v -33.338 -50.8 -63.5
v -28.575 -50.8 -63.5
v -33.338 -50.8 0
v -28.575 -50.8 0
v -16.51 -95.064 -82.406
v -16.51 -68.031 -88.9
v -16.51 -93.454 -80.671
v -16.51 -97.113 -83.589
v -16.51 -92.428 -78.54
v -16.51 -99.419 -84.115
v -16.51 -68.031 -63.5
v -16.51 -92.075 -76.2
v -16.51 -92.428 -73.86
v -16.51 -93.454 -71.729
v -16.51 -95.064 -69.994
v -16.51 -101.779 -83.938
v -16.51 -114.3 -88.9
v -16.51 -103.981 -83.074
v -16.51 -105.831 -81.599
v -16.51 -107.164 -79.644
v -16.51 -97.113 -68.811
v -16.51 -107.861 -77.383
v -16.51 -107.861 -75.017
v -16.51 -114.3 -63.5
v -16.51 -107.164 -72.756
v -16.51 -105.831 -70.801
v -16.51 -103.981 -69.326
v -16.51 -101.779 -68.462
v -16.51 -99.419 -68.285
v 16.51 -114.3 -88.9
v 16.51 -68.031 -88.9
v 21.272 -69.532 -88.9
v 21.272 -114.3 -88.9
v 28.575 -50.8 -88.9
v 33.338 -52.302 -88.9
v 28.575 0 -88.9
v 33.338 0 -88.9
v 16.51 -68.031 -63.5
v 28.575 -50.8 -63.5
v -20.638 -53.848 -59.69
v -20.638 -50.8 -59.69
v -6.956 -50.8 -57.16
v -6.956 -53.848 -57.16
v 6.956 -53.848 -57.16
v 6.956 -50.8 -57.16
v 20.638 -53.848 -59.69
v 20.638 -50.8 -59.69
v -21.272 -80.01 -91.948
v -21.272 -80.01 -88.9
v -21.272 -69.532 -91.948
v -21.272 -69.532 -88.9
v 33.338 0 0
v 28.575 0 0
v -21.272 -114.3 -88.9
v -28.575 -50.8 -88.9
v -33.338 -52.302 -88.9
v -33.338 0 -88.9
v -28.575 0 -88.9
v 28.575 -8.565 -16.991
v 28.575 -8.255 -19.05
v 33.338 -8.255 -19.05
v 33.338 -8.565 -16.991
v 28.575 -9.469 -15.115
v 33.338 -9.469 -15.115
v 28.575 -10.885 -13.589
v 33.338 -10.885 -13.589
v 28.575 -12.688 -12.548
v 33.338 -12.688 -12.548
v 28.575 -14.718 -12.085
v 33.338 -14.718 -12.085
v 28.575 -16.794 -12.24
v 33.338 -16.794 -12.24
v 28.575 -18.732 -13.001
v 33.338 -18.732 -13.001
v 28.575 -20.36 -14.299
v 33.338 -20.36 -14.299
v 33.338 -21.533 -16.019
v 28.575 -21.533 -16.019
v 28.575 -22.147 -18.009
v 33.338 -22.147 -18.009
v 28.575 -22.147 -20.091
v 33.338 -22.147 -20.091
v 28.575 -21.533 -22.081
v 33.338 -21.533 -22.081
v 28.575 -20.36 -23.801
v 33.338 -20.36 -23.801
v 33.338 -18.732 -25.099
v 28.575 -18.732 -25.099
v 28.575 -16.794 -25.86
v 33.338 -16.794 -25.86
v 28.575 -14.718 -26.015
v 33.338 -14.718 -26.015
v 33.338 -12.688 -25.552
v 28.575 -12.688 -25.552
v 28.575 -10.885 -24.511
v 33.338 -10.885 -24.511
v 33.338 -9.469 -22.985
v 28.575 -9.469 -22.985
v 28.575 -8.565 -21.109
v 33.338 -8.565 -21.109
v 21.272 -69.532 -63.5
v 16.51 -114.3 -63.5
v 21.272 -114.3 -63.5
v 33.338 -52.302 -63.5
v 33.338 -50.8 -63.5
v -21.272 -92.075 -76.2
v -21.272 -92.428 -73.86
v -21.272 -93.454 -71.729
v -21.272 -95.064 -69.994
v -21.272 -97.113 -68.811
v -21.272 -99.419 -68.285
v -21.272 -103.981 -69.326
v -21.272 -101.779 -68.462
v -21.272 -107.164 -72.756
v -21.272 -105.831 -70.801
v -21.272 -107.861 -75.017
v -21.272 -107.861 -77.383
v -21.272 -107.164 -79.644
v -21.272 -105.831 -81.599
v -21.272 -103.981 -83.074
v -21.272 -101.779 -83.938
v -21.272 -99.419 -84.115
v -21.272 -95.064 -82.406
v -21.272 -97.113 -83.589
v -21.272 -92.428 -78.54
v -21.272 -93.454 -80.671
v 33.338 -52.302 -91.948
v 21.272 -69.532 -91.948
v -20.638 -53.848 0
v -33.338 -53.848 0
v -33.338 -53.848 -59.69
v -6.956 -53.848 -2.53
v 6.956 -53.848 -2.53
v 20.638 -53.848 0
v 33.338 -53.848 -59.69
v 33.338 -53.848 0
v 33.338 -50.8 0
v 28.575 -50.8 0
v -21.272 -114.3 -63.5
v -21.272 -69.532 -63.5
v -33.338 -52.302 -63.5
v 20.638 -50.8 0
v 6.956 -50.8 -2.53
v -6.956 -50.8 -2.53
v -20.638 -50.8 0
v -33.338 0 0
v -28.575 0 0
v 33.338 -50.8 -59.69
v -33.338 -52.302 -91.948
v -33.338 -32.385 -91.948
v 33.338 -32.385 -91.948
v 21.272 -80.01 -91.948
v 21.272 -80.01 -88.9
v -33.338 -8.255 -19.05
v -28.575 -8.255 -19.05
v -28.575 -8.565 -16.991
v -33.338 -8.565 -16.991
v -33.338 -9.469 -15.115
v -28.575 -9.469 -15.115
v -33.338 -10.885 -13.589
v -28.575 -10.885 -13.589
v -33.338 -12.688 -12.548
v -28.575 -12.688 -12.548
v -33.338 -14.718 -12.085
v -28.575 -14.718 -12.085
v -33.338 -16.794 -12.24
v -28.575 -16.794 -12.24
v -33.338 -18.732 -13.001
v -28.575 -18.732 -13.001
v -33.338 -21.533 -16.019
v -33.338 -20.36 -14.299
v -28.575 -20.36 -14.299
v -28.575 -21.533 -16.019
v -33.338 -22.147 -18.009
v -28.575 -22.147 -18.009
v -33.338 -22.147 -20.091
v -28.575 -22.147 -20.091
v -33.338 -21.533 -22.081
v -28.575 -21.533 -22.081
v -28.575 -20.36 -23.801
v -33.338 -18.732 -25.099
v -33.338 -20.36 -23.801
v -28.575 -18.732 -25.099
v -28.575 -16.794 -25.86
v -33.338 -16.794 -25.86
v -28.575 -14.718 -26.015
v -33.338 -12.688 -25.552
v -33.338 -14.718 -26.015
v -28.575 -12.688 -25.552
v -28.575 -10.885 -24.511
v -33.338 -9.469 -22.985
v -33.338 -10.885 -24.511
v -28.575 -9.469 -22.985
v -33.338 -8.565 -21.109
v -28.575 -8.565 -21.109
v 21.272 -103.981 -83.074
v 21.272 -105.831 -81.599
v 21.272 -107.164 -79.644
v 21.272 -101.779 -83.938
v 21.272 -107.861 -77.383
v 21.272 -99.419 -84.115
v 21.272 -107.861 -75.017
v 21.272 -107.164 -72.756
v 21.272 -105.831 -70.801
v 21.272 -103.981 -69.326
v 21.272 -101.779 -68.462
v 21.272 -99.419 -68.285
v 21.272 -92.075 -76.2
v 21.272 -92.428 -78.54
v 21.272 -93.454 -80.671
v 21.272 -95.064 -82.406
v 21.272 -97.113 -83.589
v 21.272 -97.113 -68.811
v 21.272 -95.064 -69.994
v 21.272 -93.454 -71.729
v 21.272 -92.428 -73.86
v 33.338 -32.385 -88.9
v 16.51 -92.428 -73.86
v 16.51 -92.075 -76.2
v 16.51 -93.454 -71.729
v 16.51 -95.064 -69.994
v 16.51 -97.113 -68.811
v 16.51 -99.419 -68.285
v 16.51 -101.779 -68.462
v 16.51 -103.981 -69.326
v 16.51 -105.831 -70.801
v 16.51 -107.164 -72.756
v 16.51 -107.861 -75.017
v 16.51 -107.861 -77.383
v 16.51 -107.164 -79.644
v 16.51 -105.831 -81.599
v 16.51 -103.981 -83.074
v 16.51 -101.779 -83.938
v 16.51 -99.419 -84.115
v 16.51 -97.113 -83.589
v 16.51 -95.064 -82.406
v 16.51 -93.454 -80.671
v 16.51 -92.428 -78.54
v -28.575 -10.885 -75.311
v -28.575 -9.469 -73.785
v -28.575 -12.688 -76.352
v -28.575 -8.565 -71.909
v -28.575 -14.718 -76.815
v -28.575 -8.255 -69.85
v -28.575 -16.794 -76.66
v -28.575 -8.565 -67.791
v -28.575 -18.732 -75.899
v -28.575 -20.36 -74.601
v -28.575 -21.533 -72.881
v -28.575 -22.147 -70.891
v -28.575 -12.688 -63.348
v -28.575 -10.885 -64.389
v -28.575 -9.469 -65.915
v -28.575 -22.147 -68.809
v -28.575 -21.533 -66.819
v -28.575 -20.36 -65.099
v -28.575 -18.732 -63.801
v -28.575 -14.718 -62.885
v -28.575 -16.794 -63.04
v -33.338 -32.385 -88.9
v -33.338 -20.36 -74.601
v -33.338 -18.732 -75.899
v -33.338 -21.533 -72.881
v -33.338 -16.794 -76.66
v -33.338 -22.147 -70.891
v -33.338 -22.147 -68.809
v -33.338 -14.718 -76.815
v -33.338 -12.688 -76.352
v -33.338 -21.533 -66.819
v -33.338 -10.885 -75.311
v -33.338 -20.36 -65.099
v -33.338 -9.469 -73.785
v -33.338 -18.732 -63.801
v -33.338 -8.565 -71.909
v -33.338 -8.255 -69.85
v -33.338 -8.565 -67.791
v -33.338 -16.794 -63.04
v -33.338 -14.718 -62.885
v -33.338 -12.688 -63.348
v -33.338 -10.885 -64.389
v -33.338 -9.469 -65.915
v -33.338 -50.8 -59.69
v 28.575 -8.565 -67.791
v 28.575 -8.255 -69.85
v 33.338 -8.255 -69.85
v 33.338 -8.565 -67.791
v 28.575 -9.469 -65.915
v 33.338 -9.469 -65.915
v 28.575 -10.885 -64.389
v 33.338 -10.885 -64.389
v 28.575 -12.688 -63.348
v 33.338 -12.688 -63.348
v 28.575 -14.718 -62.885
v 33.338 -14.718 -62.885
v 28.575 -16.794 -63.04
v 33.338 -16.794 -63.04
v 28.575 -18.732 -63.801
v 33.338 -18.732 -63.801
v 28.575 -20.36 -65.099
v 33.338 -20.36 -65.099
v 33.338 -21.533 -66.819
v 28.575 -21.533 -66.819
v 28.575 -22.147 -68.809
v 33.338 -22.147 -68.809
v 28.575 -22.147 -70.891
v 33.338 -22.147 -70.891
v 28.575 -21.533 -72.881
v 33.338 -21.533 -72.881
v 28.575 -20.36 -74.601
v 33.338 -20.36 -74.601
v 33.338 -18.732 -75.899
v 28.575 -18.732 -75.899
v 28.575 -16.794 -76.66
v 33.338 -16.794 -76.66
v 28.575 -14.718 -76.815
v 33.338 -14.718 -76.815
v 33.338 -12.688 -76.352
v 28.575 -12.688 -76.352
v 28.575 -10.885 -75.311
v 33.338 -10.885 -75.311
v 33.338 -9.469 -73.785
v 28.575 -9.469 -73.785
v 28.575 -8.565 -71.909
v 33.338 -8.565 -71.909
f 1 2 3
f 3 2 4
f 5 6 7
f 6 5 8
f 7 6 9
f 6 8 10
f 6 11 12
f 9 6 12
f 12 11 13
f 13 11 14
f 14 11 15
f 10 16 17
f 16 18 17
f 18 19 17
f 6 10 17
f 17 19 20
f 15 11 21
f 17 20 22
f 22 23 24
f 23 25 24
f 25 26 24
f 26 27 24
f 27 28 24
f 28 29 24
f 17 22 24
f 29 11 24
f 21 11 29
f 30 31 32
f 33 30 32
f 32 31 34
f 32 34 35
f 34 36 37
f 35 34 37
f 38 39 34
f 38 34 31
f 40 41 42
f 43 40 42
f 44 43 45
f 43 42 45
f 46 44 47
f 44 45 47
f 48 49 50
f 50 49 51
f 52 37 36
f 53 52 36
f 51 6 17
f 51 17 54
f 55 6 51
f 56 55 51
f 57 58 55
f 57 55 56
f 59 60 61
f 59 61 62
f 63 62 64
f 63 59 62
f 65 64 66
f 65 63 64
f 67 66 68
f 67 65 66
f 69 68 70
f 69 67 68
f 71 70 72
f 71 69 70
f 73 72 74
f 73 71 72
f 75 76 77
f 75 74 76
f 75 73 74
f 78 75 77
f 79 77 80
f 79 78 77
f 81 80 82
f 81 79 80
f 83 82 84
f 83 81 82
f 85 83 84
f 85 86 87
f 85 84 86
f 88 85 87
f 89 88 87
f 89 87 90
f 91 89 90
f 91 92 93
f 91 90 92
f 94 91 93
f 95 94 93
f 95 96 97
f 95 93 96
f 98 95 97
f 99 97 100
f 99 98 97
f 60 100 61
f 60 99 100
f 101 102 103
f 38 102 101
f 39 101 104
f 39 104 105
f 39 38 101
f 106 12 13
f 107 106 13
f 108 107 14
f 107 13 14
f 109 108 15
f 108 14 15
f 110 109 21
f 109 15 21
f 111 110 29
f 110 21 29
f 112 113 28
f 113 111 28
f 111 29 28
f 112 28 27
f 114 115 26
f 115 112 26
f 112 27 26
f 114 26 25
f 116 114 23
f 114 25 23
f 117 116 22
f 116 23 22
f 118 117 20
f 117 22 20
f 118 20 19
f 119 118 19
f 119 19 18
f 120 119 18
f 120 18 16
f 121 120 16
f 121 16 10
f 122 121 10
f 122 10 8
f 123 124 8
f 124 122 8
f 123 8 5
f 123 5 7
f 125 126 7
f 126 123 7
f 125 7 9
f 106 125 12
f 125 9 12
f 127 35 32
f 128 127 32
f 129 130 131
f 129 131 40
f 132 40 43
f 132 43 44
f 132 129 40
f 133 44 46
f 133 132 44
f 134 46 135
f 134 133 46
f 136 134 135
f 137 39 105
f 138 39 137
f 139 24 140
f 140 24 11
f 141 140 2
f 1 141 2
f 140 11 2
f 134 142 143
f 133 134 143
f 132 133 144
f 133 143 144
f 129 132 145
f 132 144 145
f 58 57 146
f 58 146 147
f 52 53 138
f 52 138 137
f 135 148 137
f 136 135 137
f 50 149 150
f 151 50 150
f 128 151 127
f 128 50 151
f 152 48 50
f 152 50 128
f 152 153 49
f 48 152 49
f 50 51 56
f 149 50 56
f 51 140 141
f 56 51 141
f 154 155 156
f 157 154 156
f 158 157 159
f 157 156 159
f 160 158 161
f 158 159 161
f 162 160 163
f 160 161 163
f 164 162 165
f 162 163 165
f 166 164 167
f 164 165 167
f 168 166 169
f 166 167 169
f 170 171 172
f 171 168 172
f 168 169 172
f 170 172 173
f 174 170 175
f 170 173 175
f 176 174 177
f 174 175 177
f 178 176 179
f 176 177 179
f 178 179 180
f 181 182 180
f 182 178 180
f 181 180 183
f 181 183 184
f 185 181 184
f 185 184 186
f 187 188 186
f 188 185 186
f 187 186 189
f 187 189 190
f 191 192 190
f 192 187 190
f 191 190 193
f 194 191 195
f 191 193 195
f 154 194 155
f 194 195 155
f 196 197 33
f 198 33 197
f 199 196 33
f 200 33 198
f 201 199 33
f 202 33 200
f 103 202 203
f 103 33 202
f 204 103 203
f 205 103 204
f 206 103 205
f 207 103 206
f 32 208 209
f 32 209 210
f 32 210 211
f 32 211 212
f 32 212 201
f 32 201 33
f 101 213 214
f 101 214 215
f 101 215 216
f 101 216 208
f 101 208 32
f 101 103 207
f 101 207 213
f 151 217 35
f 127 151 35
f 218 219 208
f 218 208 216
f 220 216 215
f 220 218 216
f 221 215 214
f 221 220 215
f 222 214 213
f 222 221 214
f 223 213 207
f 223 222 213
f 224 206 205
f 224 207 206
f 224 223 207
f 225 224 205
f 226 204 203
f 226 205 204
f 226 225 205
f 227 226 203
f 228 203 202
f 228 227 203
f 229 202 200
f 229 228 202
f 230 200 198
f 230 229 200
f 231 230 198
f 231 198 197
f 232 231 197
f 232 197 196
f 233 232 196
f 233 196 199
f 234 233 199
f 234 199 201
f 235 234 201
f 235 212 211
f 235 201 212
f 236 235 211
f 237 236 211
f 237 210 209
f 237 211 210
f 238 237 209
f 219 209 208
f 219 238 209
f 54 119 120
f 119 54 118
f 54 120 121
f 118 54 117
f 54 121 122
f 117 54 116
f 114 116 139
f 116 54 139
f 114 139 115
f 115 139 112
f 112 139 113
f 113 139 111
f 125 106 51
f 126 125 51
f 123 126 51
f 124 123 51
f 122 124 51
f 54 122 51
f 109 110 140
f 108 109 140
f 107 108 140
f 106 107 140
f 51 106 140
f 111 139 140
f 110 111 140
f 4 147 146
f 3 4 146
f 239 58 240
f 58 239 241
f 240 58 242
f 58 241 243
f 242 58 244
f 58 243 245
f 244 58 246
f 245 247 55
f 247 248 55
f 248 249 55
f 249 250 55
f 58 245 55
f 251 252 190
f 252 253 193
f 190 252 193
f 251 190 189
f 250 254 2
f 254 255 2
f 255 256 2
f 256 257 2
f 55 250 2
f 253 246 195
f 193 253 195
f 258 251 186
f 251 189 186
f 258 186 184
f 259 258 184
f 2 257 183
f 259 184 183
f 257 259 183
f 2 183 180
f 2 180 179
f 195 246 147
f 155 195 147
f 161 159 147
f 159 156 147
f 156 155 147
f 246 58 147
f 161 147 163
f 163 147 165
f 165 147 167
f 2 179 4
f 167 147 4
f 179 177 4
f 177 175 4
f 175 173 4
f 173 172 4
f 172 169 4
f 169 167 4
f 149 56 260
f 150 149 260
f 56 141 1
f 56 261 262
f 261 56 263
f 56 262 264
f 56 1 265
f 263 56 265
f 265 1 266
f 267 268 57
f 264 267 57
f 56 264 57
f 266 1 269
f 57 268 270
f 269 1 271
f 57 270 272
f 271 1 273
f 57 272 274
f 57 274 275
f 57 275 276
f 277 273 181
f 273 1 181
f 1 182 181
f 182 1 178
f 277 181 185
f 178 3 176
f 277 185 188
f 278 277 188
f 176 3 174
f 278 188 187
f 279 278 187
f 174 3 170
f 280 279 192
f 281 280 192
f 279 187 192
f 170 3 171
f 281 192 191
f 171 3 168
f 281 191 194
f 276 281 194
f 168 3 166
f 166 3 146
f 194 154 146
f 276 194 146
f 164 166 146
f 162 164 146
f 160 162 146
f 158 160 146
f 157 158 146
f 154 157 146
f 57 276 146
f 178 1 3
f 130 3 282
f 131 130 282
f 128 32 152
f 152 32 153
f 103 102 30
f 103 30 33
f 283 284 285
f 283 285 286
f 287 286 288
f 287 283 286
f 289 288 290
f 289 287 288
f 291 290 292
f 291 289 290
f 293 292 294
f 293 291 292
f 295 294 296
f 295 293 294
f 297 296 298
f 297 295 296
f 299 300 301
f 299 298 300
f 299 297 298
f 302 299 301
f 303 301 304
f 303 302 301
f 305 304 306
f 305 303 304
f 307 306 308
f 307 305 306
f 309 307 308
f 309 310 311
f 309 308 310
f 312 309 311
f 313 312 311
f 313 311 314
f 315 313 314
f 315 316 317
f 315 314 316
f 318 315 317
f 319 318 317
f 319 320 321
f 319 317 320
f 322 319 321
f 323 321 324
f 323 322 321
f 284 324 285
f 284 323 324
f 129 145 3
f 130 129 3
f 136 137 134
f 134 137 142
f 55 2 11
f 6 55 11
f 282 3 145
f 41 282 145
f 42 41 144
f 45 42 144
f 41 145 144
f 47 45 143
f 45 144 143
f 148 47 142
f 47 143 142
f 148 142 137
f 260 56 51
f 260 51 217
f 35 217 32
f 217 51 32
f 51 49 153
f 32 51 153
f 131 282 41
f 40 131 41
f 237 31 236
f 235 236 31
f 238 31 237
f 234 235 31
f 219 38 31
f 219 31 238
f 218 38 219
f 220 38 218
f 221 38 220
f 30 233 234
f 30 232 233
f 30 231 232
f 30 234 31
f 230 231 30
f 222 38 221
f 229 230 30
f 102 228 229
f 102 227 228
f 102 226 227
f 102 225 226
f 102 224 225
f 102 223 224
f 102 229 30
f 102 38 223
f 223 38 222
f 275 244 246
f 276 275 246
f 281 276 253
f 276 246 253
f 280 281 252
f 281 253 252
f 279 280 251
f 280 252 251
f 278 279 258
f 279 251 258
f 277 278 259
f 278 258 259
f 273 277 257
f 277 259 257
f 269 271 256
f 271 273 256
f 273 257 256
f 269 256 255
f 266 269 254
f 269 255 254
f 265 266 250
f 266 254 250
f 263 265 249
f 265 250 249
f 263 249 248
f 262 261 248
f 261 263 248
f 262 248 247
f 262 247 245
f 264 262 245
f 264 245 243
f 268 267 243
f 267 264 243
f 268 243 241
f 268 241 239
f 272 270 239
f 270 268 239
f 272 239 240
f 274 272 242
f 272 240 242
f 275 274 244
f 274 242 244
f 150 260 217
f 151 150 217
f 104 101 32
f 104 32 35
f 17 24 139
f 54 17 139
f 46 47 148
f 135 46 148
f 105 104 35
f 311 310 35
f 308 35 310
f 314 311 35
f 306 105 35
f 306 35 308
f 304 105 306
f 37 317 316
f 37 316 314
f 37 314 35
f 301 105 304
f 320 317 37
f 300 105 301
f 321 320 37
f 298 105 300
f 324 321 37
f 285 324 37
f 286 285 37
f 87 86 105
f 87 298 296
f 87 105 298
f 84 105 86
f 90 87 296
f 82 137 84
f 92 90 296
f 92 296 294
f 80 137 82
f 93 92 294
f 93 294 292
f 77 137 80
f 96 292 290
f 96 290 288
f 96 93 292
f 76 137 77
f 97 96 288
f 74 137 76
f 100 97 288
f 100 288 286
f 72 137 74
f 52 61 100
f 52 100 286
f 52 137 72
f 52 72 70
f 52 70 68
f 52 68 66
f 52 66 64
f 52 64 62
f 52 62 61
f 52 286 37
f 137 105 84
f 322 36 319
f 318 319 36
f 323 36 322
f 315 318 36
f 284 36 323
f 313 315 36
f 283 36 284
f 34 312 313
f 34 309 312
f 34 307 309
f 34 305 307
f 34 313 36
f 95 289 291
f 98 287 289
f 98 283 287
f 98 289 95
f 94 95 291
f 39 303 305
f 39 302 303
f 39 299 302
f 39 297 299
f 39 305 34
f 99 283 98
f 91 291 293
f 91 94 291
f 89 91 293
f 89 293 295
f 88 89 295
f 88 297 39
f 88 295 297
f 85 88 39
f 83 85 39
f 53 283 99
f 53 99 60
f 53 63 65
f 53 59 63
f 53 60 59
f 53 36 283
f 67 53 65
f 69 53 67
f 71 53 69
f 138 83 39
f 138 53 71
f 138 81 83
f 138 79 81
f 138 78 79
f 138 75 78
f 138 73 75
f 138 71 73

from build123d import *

# Parameters (mm, degrees)
F1_DEPTH = 88.9
F2_W     = 63.5
F2_H     = 63.5
F2_R     = 6.985
F2_R_2   = 7.9375
F3_DEPTH = 33.3385
F6_DEPTH = 3.048
F8_DEPTH = 3.048


with BuildPart() as f1:
    # F0 (on Top) → F1 (new body)
    with BuildSketch(Plane.XY):
        Polygon((33.3375, 0), (28.575, 0), (28.575, -50.8), (16.51, -68.030606), (16.51, -114.3), (21.2725, -114.3), (21.2725, -69.532216), (33.3375, -52.30161), align=None)
    extrude(amount=-F1_DEPTH)

    # F2 (on Right) → F3 (cut, through all)
    with BuildSketch(Plane.YZ):
        with Locations((-82.55, -31.75)):
            Rectangle(F2_W, F2_H)
        with Locations((-15.24, -19.05)):
            Circle(F2_R)
        with Locations((-15.24, -69.85)):
            Circle(F2_R)
        with Locations((-100.0125, -76.2)):
            Circle(F2_R_2)
    extrude(amount=F3_DEPTH, mode=Mode.SUBTRACT)


with BuildPart() as f4_1:
    # F4: instance of F1
    add(f1.part.mirror(Plane.YZ))


with BuildPart() as f6:
    # F5 (on face) → F6 (new body)
    with BuildSketch(Plane.XZ.offset(50.8)):
        with BuildLine():
            Line((-20.6375, 0), (-33.3375, 0))
            Line((-33.3375, 0), (-33.3375, -59.69))
            Line((-33.3375, -59.69), (-20.6375, -59.69))
            ThreePointArc((-20.6375, -59.69), (0, -56.842121), (20.6375, -59.69))
            Line((20.6375, -59.69), (33.3375, -59.69))
            Line((33.3375, -59.69), (33.3375, 0))
            Line((33.3375, 0), (20.6375, 0))
            ThreePointArc((20.6375, 0), (0, -2.847879), (-20.6375, 0))
        make_face()
    extrude(amount=F6_DEPTH)


with BuildPart() as f8:
    # F7 (on face) → F8 (new body)
    with BuildSketch(Plane(origin=(0, 0, -88.9), x_dir=(1, 0, 0), z_dir=(0, 0, -1))):
        Polygon((-33.3375, 52.30161), (-33.3375, 32.385), (33.3375, 32.385), (33.3375, 52.30161), (21.2725, 69.532216), (21.2725, 80.01), (-21.2725, 80.01), (-21.2725, 69.532216), align=None)
    extrude(amount=F8_DEPTH)


solid = Compound([f1.part, f4_1.part, f6.part, f8.part])
